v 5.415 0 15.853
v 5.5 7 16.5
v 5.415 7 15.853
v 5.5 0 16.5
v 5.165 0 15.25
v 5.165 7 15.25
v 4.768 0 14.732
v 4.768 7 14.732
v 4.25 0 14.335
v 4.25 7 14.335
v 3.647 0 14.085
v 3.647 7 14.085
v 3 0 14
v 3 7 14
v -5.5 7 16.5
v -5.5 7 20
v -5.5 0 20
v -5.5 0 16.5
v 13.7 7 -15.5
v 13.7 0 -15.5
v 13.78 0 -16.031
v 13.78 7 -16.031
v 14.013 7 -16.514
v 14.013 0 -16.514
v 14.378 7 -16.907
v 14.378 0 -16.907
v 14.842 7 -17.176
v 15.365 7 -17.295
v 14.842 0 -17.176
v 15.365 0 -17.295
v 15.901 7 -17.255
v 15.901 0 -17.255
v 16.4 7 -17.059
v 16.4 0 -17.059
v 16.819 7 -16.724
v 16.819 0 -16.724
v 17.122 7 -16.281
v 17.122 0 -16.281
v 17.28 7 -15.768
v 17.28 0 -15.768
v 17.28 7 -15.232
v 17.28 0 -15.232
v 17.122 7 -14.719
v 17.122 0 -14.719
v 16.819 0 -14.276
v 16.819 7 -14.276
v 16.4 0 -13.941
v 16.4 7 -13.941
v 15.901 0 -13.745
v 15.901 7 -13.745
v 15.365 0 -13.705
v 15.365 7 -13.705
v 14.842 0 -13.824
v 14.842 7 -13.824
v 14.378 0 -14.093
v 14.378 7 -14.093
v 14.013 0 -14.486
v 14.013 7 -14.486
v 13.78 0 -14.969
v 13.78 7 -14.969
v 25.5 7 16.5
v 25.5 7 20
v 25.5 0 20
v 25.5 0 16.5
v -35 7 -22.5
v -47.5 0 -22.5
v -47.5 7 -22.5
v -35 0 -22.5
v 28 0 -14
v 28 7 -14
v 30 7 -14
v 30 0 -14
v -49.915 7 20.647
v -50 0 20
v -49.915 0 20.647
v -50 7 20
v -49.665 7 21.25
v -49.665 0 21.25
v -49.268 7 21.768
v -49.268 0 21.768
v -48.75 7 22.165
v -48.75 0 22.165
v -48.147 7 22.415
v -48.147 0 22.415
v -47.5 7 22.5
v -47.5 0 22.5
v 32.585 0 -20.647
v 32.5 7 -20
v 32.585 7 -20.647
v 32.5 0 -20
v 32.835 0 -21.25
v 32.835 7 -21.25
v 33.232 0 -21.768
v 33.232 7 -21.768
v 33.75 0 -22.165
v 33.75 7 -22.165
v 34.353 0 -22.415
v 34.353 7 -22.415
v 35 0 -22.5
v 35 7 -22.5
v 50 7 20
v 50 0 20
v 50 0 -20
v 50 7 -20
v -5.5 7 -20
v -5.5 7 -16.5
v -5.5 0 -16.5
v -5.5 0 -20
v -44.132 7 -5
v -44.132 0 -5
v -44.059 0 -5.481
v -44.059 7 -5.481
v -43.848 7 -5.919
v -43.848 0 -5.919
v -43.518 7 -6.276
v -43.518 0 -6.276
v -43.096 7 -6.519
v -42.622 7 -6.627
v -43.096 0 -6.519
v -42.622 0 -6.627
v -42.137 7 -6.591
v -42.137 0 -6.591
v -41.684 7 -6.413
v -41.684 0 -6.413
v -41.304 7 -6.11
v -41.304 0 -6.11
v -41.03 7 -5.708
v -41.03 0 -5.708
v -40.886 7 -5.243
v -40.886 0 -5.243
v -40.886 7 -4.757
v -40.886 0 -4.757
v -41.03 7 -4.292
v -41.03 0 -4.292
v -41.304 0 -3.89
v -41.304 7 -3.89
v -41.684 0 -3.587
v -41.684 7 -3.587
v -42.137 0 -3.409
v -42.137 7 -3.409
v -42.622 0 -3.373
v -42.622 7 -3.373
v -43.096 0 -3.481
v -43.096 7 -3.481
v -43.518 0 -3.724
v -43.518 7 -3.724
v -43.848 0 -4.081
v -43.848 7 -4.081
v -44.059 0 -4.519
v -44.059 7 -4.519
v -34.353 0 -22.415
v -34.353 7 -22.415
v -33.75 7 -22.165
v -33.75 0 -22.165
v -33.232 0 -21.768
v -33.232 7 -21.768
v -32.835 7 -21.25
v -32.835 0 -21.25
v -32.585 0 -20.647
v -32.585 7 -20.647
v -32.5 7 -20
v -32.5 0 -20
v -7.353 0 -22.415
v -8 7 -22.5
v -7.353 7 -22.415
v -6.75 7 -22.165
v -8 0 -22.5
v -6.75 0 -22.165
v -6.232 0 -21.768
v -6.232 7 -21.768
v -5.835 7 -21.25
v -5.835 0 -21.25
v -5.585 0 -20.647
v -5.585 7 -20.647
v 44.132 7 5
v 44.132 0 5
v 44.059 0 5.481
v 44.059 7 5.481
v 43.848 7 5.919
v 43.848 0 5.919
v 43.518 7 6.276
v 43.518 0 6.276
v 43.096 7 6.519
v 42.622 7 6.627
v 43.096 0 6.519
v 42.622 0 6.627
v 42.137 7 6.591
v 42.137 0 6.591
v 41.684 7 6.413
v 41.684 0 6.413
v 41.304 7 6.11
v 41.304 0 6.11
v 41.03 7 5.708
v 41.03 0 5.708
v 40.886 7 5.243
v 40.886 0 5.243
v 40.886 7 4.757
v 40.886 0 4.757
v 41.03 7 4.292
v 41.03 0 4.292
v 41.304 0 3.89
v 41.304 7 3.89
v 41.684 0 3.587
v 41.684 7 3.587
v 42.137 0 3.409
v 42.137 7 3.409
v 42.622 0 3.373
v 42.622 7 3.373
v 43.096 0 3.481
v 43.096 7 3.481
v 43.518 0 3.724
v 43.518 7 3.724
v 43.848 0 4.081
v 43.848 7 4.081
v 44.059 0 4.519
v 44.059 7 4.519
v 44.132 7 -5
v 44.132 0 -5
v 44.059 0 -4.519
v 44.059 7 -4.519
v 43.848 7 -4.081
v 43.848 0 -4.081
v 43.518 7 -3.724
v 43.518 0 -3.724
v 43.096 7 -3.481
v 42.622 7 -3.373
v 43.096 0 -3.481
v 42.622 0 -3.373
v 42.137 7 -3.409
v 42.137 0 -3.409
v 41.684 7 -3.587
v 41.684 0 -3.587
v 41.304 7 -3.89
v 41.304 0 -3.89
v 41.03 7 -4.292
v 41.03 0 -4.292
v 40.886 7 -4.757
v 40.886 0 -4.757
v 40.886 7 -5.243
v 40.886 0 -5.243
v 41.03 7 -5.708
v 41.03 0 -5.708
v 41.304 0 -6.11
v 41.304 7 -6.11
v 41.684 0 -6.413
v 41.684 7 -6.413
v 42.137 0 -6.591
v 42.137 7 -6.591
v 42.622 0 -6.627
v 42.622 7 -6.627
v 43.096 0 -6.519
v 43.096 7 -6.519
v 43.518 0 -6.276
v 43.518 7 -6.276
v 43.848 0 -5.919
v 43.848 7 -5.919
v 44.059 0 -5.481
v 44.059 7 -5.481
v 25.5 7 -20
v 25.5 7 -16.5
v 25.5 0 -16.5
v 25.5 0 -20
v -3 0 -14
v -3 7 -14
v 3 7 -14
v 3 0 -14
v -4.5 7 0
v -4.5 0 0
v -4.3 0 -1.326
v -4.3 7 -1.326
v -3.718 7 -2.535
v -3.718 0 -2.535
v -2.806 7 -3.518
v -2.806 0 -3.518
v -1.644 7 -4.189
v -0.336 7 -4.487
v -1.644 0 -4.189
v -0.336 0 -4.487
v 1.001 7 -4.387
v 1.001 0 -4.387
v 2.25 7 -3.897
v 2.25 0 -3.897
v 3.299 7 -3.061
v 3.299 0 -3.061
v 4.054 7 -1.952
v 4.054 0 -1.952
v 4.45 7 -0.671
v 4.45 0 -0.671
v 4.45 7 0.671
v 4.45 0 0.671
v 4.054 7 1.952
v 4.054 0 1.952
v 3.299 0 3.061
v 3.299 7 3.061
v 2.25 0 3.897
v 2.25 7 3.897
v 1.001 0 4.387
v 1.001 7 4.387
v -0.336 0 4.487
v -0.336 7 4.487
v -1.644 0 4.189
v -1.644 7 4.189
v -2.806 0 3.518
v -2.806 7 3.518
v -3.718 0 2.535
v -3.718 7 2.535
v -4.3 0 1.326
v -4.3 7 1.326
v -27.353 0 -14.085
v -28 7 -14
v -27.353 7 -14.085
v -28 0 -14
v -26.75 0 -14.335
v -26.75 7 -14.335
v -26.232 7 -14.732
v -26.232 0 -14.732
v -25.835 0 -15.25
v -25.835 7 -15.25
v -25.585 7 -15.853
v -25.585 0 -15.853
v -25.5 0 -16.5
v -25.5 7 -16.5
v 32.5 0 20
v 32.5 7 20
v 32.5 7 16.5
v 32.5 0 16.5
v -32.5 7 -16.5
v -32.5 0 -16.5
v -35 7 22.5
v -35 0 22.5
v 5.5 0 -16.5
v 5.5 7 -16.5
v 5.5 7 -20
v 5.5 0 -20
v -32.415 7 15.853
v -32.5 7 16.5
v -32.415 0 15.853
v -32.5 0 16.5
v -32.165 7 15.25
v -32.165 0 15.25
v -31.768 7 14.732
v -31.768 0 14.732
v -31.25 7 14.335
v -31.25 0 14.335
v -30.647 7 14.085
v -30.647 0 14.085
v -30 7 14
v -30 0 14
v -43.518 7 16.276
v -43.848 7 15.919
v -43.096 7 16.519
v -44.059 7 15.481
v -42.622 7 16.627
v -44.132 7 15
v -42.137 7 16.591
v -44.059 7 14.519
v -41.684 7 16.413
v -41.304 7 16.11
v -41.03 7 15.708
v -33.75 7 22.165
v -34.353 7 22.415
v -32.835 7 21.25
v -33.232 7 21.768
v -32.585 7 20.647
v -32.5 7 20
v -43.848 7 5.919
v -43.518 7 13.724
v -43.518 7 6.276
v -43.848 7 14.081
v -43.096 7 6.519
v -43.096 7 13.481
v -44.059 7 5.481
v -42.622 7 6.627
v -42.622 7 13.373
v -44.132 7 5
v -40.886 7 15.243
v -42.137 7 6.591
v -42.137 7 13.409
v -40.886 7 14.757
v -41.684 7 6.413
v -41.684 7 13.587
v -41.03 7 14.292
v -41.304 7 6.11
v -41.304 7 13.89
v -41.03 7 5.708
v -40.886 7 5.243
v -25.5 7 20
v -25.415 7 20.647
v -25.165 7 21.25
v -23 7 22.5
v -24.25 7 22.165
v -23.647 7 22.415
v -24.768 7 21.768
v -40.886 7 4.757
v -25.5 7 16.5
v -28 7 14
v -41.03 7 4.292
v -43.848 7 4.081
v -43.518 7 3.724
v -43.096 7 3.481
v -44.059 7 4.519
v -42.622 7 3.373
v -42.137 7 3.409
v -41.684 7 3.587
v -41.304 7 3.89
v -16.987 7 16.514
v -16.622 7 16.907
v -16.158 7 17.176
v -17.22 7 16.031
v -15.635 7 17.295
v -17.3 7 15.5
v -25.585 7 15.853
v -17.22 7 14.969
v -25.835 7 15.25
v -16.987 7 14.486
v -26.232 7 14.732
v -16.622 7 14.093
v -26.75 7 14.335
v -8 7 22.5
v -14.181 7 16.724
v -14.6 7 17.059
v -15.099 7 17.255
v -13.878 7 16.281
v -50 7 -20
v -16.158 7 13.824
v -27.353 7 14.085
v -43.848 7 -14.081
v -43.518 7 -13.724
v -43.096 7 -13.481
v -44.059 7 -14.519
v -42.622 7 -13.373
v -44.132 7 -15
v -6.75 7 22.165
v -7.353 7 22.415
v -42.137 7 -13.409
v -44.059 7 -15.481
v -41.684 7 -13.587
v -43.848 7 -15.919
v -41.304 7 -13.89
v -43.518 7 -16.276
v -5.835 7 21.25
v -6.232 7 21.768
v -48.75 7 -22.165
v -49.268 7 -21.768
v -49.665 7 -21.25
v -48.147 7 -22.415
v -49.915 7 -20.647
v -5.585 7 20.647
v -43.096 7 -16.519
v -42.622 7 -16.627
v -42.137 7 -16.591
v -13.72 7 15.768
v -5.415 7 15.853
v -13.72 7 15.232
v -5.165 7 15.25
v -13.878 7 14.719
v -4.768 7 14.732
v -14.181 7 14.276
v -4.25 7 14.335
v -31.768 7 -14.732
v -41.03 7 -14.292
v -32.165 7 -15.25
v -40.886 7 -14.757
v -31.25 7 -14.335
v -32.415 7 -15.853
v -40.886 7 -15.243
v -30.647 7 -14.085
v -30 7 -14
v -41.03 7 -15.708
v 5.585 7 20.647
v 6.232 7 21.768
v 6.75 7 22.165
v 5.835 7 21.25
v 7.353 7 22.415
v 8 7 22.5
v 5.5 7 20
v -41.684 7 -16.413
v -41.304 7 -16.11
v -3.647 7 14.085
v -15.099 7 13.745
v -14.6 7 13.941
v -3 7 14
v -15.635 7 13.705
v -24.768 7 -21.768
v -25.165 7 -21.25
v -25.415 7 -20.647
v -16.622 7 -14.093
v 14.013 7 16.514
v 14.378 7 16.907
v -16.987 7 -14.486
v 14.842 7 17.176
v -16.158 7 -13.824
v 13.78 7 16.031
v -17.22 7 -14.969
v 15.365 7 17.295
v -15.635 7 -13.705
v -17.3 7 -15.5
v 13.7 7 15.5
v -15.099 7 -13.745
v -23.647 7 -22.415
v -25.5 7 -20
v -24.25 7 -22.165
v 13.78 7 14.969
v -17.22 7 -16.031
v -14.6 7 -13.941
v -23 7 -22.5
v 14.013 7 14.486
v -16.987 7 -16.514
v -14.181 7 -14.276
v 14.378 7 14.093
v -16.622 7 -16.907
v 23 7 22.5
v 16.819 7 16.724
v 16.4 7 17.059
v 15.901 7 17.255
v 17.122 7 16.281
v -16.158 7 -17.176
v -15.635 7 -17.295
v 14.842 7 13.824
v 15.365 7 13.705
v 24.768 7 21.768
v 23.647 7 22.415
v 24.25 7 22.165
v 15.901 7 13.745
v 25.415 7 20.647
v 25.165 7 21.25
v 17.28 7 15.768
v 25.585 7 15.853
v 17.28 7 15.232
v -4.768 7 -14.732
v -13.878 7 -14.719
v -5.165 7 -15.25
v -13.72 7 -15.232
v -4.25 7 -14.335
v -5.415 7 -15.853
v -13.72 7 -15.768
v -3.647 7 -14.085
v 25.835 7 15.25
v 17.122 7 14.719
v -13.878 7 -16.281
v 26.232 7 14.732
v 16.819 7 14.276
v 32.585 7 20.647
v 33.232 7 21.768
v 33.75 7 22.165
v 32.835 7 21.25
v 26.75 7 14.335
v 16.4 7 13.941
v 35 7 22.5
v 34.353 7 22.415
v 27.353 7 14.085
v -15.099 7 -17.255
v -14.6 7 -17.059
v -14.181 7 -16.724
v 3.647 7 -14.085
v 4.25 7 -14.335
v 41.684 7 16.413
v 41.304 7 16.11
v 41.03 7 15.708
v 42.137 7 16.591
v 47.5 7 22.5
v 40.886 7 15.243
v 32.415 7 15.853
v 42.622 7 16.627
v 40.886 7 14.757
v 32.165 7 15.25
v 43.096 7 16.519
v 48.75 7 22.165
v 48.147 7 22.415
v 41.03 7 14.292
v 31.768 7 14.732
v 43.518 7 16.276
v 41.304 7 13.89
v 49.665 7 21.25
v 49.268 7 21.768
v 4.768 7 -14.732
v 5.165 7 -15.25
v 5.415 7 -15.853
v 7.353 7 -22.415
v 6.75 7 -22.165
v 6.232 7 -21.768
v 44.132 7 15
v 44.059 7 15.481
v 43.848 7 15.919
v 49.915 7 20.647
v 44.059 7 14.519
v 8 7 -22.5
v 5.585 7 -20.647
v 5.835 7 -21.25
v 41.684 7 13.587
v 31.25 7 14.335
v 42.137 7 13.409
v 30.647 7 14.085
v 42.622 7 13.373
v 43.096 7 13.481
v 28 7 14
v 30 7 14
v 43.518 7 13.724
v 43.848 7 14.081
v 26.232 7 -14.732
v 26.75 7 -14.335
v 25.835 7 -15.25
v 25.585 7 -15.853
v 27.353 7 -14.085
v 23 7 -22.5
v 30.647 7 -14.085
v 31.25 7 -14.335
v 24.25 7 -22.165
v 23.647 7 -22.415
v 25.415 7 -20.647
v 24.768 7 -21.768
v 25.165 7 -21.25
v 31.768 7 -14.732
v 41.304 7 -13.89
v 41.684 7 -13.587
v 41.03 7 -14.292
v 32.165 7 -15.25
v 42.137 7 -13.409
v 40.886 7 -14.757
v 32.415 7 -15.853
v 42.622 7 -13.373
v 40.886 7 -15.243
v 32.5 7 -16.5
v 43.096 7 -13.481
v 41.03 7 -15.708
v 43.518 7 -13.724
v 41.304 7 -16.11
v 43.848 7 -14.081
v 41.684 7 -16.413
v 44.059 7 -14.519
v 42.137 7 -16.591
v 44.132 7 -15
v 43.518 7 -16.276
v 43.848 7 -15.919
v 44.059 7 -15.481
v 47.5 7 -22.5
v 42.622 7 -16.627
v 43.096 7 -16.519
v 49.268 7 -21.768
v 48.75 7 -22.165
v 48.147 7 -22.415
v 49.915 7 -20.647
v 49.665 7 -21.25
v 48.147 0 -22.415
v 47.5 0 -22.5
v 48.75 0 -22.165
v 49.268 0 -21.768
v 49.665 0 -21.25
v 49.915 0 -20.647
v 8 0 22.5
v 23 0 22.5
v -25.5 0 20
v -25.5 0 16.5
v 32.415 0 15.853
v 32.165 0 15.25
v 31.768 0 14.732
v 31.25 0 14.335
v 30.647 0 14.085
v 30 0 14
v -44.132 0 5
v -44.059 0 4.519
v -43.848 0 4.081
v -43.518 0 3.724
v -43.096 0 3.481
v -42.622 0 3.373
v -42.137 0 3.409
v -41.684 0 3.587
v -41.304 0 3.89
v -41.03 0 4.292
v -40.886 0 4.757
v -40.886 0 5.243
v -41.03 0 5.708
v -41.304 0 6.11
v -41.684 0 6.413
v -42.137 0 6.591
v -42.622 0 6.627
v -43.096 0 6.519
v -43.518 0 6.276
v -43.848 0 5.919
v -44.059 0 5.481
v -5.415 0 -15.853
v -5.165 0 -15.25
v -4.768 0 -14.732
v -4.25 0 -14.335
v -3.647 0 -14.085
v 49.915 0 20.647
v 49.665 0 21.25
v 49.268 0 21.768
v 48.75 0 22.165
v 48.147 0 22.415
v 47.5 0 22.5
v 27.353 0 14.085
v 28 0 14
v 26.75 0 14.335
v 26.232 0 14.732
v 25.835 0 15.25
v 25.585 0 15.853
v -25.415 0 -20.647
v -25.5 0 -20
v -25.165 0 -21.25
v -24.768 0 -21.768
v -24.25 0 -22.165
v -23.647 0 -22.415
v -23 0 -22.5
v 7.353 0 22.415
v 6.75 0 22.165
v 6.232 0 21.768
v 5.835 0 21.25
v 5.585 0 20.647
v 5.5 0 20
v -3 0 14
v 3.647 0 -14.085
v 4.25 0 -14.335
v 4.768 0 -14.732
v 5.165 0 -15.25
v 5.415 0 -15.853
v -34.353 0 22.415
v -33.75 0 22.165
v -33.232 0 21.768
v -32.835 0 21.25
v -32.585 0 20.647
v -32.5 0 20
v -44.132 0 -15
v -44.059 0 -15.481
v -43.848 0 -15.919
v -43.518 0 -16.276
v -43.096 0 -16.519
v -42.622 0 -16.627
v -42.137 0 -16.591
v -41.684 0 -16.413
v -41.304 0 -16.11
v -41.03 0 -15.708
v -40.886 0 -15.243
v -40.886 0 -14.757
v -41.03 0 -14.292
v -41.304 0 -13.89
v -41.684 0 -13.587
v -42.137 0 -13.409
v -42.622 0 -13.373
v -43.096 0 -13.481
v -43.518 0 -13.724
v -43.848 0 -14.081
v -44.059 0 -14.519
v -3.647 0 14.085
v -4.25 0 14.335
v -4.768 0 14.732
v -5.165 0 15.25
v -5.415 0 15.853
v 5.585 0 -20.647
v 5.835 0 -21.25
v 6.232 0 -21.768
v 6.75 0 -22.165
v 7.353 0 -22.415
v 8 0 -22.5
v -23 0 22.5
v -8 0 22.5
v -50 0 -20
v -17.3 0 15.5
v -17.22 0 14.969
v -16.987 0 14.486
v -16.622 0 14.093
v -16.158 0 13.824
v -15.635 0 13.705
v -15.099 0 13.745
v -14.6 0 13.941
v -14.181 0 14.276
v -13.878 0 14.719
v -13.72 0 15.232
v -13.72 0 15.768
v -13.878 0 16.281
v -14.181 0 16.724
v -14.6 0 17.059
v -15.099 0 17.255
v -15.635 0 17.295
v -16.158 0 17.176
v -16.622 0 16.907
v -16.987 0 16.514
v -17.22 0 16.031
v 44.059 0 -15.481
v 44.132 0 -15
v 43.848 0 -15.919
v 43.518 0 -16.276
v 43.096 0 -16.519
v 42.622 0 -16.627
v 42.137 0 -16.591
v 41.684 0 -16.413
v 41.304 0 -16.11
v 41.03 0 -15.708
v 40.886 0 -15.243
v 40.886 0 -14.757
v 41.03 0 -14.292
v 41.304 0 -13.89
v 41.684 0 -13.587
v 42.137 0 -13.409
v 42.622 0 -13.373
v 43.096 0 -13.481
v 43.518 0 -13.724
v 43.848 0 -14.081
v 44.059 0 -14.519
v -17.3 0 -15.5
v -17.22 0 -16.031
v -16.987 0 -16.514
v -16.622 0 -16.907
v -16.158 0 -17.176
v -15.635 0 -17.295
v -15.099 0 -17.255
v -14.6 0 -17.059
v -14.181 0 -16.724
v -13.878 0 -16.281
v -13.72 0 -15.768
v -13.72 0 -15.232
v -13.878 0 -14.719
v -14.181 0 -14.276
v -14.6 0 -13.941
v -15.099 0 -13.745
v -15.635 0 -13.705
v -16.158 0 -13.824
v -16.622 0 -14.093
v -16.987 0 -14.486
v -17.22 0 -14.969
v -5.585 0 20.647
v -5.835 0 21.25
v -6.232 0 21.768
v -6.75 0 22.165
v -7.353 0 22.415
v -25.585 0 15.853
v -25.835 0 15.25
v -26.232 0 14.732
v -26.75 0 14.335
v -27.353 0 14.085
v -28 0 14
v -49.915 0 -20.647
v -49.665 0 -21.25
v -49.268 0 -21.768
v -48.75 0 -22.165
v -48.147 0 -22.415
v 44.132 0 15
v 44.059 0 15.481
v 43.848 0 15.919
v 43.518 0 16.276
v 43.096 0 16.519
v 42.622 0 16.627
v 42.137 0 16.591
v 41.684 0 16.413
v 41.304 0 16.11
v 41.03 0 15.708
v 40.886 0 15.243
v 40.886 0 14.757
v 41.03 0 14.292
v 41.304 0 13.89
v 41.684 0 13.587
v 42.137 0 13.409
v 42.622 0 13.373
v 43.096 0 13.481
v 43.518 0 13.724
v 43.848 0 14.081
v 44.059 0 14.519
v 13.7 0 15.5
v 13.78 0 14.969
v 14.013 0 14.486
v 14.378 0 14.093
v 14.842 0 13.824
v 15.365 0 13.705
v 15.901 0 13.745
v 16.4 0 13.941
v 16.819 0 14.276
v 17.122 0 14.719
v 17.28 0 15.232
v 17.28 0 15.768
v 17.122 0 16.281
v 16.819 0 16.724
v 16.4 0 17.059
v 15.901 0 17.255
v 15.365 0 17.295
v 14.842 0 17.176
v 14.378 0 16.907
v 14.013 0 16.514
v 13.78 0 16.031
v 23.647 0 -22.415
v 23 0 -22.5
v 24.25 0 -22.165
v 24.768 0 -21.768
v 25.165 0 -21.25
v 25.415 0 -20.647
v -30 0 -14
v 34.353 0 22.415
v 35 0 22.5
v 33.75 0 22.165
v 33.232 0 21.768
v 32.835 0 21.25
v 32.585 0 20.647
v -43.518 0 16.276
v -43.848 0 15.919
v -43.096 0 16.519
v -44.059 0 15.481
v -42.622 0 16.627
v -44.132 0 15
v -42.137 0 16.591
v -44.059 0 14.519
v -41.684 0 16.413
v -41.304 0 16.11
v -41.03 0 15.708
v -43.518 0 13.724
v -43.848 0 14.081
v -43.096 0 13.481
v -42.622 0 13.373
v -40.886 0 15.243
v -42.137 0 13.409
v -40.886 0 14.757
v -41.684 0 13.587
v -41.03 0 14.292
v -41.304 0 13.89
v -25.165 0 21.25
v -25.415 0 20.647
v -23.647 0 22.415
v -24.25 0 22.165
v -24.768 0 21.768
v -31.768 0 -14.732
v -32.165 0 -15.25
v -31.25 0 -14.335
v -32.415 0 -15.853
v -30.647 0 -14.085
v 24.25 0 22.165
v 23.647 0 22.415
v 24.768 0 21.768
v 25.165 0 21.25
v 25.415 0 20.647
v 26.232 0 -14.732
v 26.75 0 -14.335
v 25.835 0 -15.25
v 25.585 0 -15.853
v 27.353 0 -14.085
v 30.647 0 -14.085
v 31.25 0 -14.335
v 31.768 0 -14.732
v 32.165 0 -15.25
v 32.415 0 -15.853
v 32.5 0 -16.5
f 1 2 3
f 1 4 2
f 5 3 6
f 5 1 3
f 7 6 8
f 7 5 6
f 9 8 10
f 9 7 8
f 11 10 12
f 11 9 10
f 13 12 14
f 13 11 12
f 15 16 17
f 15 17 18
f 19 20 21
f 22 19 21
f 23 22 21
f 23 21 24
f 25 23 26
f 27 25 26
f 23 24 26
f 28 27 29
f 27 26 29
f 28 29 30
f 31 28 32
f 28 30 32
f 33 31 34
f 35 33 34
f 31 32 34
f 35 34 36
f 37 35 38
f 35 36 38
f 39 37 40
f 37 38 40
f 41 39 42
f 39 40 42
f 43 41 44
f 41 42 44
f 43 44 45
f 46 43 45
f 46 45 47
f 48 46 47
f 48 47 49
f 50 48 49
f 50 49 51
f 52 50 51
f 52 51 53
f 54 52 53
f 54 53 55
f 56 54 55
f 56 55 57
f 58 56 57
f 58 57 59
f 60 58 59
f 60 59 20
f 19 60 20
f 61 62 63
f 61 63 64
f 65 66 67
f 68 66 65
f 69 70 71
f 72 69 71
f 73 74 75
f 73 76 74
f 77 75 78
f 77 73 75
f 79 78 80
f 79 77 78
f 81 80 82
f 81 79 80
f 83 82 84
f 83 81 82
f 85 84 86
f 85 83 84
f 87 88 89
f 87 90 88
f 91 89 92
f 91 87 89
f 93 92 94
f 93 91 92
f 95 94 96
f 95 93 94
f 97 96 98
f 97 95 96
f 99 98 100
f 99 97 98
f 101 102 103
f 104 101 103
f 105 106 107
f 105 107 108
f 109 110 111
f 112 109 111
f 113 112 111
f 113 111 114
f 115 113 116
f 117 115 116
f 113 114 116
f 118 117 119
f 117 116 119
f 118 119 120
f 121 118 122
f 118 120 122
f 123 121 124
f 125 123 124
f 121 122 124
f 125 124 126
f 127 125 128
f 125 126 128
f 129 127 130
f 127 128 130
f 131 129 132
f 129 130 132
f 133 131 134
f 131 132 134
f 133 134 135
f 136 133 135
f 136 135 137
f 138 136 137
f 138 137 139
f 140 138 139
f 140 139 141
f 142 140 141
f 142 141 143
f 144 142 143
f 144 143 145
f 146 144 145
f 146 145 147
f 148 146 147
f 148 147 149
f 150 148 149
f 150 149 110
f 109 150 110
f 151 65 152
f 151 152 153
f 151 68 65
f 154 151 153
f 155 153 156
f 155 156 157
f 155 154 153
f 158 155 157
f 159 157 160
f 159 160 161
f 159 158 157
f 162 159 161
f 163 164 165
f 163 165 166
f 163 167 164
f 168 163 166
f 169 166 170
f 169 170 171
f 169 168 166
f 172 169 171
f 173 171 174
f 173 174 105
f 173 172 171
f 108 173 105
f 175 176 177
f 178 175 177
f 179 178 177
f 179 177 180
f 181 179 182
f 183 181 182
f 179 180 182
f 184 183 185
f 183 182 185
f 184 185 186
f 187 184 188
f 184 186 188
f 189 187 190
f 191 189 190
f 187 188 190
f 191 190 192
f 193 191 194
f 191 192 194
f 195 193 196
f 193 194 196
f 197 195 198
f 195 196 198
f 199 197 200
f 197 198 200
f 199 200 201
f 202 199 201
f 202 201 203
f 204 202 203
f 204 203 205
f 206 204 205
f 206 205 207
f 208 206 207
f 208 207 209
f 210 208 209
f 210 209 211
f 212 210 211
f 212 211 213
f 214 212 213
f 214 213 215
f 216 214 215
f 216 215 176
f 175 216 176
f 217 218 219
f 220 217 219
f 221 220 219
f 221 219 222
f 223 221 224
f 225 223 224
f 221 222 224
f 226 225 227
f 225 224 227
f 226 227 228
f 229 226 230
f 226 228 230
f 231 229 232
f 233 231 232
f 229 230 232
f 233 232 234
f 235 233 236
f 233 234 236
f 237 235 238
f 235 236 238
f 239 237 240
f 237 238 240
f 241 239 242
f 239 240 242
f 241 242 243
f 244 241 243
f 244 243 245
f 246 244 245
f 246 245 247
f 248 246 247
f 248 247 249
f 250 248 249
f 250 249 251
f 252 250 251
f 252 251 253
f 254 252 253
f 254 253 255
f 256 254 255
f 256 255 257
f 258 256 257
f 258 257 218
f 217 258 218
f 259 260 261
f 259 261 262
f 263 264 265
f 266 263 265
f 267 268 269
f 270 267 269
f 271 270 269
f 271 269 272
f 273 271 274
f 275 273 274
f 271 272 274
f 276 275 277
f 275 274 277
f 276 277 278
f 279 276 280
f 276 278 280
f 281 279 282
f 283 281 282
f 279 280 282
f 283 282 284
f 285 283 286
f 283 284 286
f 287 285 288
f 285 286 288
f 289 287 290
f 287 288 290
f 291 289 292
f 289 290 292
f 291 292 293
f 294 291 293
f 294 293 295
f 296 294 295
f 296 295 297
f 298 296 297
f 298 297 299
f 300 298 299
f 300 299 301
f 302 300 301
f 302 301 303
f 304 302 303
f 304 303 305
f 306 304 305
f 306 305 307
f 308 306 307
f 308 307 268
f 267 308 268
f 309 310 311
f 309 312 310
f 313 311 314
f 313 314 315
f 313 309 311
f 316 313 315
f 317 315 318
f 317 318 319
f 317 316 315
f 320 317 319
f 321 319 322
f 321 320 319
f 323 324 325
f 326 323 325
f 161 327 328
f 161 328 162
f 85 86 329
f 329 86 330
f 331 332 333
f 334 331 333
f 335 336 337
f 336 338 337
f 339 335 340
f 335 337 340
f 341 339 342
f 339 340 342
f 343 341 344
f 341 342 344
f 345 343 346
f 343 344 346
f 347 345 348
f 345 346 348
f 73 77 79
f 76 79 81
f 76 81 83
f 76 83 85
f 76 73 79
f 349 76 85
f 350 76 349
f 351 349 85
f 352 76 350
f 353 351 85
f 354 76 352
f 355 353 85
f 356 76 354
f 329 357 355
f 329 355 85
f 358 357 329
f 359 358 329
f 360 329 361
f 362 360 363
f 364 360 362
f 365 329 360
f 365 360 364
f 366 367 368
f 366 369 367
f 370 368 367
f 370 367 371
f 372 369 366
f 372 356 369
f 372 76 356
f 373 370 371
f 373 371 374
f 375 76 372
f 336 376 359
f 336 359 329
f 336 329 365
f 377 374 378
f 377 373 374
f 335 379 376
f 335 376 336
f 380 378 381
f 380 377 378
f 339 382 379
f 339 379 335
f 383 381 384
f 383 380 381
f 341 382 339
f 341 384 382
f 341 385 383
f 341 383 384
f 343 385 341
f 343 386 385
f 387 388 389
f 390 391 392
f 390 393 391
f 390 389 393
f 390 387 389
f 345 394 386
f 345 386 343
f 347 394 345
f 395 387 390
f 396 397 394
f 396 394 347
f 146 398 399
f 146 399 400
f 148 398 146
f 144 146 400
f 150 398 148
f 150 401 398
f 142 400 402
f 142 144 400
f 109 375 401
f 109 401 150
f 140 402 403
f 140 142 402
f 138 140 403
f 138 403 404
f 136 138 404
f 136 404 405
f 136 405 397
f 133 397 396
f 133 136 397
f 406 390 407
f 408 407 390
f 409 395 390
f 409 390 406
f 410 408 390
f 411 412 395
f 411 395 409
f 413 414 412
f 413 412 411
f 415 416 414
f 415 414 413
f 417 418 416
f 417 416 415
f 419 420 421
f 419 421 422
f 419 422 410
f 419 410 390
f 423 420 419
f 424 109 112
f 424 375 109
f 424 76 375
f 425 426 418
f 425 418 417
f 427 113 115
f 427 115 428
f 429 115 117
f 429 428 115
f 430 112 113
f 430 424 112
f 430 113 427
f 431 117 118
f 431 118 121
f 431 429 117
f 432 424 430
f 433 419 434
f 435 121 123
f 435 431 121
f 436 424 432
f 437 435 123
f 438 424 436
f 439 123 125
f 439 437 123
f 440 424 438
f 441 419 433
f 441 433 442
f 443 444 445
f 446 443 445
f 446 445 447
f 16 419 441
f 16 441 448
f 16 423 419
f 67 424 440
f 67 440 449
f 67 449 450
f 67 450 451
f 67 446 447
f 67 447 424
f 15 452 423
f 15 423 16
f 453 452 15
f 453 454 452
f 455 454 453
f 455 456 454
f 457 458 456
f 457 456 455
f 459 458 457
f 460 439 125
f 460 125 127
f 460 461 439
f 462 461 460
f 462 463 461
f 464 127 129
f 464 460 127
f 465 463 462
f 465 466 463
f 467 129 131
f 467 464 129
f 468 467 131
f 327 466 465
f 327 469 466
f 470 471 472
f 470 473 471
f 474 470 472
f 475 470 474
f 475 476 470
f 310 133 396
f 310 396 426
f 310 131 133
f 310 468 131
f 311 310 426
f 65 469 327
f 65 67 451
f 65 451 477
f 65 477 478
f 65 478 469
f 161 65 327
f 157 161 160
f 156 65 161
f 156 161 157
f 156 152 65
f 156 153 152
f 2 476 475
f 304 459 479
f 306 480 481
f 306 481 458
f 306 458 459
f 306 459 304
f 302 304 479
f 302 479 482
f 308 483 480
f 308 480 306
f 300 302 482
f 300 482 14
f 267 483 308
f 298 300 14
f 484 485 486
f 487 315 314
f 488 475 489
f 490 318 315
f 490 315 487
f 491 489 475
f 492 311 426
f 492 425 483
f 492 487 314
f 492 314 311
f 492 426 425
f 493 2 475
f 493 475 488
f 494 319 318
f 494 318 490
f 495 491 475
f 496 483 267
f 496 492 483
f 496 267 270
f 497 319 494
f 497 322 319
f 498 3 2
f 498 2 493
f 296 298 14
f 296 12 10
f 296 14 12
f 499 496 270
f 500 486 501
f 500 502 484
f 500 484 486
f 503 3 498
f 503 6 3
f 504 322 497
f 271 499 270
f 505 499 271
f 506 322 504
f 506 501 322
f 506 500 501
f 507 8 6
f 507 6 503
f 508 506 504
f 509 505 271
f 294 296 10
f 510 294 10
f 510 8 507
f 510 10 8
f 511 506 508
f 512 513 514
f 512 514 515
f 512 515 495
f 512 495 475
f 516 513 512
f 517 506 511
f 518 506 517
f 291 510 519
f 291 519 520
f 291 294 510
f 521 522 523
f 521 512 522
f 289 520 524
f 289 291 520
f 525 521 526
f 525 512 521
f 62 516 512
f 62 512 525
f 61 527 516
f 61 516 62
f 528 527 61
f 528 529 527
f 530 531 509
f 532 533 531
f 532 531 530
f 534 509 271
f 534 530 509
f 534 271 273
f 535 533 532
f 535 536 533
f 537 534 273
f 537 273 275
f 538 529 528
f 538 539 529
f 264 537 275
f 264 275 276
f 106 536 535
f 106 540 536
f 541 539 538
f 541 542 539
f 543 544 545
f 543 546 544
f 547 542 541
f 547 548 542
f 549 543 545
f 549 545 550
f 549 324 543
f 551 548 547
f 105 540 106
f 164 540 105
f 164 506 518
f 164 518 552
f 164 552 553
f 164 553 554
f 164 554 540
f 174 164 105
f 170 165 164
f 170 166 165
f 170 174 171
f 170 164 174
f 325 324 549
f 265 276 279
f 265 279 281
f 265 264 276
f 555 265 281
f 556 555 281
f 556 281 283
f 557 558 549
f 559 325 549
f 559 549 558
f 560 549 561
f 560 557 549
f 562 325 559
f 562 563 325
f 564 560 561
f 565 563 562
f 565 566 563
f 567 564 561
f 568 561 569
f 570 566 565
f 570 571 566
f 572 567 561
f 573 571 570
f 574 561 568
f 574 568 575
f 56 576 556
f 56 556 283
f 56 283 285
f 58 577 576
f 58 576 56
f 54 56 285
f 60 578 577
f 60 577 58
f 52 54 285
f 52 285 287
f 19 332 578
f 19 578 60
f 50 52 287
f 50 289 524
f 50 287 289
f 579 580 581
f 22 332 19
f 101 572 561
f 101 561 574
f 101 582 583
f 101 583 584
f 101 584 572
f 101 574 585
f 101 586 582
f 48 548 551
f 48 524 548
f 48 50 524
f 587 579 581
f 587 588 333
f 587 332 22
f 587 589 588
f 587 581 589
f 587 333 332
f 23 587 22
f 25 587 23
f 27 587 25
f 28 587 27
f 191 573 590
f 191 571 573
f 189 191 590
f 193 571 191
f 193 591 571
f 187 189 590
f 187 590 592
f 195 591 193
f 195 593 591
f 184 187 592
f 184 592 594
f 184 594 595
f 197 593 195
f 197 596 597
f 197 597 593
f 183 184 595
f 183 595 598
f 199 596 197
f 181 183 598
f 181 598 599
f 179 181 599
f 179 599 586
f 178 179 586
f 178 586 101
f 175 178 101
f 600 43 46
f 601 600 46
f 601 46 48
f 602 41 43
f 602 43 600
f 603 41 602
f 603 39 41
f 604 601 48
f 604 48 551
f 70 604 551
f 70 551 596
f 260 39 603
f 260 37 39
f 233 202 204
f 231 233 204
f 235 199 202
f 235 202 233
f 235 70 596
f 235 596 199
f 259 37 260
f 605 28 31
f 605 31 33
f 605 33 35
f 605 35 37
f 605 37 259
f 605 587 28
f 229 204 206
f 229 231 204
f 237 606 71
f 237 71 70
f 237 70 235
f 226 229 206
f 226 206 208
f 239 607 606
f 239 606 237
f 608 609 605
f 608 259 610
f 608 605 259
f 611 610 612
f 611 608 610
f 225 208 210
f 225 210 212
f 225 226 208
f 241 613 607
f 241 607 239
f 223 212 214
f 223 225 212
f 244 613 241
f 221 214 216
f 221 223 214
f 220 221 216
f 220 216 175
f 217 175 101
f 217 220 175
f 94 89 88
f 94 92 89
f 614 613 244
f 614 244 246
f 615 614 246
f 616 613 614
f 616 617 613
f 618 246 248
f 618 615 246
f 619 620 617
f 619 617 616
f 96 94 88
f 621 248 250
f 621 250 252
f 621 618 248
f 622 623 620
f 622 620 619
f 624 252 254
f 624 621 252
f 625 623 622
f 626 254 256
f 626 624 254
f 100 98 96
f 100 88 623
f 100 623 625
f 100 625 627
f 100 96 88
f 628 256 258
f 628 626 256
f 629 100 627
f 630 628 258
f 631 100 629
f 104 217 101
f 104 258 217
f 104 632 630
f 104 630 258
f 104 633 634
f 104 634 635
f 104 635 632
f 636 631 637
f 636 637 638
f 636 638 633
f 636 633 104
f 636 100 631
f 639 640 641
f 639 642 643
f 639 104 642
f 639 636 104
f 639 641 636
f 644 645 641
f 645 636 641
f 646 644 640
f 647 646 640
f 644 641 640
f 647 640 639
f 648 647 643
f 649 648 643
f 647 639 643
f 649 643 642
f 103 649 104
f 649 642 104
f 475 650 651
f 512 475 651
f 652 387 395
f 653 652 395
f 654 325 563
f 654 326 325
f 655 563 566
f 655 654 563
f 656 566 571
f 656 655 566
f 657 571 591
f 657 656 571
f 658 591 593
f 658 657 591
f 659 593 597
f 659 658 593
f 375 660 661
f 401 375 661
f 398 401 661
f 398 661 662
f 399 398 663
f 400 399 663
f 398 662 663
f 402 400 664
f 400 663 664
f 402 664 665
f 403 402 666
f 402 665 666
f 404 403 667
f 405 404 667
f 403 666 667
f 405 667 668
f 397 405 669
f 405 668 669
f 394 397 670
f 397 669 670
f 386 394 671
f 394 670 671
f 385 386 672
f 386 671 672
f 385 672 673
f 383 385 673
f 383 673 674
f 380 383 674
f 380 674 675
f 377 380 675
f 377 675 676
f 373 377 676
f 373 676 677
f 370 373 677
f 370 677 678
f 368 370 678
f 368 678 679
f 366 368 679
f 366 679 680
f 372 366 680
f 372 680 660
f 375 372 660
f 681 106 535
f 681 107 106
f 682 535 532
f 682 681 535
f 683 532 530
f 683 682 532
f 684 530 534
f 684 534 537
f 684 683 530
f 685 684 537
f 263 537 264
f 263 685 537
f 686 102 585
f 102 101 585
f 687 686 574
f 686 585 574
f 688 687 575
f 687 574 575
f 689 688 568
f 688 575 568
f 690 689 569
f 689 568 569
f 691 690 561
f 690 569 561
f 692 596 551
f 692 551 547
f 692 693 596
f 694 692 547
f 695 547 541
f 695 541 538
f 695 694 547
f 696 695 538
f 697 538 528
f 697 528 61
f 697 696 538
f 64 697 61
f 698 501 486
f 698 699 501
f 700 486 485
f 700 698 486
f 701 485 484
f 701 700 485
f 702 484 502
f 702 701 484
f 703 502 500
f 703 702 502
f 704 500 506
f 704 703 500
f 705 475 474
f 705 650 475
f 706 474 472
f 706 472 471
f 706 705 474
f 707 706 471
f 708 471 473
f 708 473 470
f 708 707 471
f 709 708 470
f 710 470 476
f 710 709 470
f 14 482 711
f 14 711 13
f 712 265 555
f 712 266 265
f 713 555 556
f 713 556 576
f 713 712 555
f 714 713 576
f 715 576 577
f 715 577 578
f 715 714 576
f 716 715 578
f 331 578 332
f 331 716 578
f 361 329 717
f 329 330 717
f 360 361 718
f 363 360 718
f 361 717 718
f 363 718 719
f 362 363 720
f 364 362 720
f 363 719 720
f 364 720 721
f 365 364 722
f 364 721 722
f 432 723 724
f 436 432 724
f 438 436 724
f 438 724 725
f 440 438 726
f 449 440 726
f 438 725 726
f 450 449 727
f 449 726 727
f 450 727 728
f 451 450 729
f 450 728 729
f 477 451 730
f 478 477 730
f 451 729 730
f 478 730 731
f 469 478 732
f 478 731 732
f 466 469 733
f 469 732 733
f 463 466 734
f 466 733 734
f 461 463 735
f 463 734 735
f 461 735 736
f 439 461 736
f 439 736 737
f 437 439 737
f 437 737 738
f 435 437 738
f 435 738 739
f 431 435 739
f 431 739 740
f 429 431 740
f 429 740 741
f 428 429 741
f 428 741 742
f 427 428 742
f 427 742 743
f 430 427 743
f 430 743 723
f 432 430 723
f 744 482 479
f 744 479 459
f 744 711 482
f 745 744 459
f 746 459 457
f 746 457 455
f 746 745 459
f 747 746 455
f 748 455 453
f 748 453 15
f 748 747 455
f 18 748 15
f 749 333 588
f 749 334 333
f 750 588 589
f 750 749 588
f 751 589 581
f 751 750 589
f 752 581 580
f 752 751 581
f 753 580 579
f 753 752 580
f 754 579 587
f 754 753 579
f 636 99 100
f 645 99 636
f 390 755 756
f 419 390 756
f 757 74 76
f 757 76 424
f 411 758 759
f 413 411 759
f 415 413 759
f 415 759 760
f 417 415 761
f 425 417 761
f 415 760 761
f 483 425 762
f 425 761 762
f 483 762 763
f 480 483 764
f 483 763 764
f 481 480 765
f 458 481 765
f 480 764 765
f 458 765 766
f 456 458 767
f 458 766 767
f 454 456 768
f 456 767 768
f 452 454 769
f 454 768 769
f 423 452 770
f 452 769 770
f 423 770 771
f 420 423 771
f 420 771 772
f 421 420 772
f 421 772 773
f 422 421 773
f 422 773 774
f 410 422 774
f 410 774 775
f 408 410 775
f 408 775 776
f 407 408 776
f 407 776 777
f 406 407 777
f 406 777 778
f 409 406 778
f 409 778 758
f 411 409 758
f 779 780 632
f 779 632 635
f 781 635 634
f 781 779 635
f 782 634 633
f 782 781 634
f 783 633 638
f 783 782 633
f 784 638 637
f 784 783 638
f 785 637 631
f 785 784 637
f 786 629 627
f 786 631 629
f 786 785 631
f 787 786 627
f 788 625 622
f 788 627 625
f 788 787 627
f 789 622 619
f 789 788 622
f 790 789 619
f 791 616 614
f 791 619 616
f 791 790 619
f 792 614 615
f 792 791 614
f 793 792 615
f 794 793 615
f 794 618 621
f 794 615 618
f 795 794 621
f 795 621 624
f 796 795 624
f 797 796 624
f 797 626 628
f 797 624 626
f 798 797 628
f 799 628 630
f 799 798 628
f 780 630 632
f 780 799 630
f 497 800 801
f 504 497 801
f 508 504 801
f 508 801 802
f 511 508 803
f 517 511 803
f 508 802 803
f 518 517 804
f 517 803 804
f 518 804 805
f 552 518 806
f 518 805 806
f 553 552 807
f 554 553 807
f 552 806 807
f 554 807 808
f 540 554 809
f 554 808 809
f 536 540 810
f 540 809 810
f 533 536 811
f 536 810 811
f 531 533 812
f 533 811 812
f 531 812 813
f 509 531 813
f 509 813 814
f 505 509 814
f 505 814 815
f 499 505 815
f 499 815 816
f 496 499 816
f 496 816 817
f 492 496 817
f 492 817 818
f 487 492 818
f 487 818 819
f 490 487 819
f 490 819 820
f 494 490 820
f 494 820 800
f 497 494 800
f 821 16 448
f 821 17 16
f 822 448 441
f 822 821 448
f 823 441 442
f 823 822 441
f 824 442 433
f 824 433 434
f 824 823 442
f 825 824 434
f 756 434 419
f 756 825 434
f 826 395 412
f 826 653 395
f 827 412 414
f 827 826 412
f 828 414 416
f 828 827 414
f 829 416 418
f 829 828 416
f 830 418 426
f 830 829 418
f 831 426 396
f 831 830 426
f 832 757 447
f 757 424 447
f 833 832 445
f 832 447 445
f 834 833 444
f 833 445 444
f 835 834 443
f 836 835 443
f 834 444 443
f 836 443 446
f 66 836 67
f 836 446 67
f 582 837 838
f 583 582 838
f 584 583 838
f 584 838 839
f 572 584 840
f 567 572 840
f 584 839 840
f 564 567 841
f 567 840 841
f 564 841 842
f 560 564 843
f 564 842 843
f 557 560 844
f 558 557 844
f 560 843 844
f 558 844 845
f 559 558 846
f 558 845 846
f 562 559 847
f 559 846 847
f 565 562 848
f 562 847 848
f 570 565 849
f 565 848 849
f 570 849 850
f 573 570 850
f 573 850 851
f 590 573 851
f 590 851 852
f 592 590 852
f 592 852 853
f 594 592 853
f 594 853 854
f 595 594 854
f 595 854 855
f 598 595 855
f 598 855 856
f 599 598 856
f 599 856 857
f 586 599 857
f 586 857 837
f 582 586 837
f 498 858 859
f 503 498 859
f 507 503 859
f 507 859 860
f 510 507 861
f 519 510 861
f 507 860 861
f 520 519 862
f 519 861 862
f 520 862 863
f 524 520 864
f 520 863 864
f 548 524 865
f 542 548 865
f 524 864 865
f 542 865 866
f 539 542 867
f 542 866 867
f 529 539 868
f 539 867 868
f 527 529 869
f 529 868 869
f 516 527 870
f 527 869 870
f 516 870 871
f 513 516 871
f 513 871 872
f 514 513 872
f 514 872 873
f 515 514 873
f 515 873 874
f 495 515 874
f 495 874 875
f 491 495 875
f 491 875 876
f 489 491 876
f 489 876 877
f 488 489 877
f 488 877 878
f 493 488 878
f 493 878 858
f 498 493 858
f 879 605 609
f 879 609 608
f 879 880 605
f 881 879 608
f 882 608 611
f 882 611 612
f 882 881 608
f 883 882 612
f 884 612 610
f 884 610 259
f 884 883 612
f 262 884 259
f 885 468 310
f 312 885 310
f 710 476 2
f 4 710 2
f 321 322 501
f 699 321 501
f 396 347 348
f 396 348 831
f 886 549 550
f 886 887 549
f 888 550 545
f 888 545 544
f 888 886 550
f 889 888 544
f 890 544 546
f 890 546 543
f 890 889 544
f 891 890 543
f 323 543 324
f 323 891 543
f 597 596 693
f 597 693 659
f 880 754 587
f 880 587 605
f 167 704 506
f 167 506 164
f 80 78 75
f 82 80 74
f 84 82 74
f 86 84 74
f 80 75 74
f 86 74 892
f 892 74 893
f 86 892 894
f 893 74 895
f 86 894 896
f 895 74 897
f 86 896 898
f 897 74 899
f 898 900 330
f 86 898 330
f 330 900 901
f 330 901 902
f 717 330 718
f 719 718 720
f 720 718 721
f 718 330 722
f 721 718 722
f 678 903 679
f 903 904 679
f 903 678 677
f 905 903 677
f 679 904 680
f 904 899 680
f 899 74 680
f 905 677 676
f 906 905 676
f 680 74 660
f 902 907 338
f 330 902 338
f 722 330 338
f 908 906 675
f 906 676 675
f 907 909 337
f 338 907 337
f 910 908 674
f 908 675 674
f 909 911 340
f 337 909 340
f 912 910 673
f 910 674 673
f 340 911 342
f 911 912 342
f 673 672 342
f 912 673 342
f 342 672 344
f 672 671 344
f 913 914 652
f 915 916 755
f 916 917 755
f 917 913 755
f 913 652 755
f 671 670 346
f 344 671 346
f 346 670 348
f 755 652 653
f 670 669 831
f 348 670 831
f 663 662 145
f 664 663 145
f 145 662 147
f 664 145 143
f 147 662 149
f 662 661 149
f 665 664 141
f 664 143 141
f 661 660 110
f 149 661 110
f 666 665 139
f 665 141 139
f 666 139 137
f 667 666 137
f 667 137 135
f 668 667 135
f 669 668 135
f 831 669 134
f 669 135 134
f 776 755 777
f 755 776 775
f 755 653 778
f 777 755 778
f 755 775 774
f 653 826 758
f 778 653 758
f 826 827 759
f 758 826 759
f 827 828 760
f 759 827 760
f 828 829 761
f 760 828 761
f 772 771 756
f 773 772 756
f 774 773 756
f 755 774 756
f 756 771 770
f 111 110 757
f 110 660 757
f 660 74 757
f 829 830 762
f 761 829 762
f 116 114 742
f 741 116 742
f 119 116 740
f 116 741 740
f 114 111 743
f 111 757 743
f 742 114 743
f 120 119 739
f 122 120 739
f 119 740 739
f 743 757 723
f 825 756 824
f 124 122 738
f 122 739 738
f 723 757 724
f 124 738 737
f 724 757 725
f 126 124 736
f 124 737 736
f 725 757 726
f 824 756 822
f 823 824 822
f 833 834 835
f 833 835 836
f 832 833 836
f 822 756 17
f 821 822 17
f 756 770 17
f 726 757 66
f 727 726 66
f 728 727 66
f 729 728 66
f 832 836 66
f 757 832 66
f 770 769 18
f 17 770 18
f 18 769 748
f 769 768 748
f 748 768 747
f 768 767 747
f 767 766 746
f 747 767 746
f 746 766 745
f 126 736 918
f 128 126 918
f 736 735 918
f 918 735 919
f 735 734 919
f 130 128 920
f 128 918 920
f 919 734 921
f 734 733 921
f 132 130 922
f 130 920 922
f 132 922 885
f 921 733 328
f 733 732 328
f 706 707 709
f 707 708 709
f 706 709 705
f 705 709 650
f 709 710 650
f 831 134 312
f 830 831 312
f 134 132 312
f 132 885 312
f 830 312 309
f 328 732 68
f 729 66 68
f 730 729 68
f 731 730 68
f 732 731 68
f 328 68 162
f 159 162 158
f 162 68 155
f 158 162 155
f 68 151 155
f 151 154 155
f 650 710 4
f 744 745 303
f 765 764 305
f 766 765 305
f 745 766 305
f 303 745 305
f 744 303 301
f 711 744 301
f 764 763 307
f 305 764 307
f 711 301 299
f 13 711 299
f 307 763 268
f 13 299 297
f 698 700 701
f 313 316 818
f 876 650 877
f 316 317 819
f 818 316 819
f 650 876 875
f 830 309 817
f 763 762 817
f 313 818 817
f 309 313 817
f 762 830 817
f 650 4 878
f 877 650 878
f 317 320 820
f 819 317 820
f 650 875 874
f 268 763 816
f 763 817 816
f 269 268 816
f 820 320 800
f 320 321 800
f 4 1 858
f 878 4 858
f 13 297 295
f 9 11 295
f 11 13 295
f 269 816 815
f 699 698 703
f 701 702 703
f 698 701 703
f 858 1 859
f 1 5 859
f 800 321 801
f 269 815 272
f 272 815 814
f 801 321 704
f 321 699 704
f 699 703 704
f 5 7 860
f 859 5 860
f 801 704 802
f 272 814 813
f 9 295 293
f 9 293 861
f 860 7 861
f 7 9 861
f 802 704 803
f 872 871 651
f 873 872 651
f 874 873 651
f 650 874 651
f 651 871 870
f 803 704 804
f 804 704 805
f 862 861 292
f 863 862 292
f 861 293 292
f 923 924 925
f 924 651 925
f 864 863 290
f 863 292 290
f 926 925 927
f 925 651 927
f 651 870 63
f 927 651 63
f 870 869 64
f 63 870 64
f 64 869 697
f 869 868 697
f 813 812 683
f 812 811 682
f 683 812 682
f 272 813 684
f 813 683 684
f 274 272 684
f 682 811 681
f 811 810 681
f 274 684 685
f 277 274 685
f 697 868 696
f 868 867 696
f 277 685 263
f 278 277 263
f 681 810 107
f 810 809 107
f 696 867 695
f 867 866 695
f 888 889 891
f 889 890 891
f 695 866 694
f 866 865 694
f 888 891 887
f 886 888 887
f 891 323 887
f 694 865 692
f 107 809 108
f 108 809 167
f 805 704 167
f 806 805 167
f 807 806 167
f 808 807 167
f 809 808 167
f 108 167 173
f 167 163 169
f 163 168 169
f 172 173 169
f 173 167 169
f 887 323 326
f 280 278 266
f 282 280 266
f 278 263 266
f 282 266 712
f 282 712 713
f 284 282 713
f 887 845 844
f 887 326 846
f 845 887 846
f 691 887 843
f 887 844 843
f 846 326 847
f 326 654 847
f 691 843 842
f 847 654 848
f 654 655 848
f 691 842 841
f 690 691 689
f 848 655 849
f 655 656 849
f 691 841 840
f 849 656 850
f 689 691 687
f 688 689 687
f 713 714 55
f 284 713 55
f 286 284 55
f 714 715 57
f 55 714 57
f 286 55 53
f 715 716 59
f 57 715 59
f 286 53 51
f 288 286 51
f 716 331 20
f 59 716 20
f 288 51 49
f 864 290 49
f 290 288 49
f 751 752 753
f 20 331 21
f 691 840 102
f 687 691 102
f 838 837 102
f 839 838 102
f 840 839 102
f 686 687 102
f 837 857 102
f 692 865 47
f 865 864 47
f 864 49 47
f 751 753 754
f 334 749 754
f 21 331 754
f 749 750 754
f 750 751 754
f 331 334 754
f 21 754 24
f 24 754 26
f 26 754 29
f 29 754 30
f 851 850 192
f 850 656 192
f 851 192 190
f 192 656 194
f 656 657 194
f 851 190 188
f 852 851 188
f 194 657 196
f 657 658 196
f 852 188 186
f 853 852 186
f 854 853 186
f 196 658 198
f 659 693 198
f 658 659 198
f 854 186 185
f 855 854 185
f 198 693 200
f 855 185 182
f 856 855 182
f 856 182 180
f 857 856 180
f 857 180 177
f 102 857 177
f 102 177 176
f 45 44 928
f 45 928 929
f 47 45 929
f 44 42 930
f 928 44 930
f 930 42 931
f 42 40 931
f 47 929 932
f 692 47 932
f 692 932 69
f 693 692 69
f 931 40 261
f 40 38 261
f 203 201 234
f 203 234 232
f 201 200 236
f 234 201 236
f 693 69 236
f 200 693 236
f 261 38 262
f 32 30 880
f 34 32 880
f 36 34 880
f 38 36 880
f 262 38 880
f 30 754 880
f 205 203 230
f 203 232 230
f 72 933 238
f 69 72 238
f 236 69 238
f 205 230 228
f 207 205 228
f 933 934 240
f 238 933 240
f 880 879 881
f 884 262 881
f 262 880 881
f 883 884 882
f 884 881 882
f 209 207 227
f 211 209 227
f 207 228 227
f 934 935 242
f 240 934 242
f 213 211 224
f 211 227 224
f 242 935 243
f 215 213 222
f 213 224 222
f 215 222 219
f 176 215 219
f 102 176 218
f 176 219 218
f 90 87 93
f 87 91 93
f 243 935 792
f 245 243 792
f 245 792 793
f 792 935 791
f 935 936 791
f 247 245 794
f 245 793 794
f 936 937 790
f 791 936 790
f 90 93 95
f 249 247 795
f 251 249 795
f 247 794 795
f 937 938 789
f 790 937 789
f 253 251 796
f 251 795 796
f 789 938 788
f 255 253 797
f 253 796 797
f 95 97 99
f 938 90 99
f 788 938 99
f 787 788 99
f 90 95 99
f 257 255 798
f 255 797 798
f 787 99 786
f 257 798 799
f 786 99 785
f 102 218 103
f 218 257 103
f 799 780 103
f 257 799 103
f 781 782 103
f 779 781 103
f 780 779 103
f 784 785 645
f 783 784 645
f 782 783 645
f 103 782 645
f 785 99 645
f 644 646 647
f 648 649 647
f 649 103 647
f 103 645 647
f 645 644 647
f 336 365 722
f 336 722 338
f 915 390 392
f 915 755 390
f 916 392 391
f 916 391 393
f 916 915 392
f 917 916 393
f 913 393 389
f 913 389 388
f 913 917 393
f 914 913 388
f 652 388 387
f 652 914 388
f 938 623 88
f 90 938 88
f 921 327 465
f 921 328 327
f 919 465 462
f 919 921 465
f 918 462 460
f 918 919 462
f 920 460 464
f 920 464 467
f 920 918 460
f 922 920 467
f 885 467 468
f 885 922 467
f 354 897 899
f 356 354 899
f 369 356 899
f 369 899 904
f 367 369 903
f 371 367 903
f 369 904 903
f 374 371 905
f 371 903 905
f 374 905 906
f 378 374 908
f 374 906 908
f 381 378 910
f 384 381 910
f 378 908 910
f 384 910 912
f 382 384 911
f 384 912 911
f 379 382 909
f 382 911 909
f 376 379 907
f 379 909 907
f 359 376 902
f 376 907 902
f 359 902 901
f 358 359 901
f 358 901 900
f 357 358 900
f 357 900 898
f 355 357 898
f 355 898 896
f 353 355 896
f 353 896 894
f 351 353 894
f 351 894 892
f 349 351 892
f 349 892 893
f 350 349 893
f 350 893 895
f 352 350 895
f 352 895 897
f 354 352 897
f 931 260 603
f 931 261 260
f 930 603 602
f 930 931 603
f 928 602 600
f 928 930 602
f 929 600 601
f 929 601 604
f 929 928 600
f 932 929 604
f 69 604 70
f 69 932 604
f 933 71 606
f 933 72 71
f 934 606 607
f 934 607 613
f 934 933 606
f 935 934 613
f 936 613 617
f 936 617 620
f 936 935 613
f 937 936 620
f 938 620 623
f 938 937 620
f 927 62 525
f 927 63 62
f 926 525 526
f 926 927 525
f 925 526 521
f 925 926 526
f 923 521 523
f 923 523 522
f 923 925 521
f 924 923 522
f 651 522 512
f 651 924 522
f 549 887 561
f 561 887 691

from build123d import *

# Parameters (mm, degrees)
SKETCH1_W             = 100
SKETCH1_H             = 45
BOSS_EXTRUDE1_DEPTH   = 7
M3_CLEARANCE_HOLE1_D  = 3.6
M8_CLEARANCE_HOLE1_D  = 9
F_4_CLEARANCE_HOLE1_D = 3.2639
LPATTERN1_COUNT       = 4
LPATTERN1_PITCH       = 10
MIRROR1_COPY_1_D      = 3.2639
MIRROR1_COPY_2_D      = 3.2639
MIRROR1_COPY_3_D      = 3.2639
SKETCH9_W             = 7
SKETCH9_H             = 8.5
SKETCH9_W_2           = 11
CUT_EXTRUDE1_DEPTH    = 8
FILLET1_R             = 2.5


with BuildPart() as part:
    # Sketch1 → Boss-Extrude1 (new body)
    with BuildSketch(Plane(origin=(0, 0, 0), x_dir=(1, 0, 0), z_dir=(0, 1, 0))):
        Rectangle(SKETCH1_W, SKETCH1_H)
    extrude(amount=BOSS_EXTRUDE1_DEPTH)

    # M3 Clearance Hole1 (through all)
    with Locations(Plane(origin=(0, 7, 0), x_dir=(1, 0, 0), z_dir=(0, 1, 0))):
        with Locations((15.5, 15.5), (-15.5, 15.5), (-15.5, -15.5), (15.5, -15.5)):
            Hole(M3_CLEARANCE_HOLE1_D / 2)

    # M8 Clearance Hole1 (through all)
    with Locations(Plane(origin=(0, 7, 0), x_dir=(1, 0, 0), z_dir=(0, 1, 0))):
        with Locations((0, 0)):
            Hole(M8_CLEARANCE_HOLE1_D / 2)

    # #4 Clearance Hole1 (through all)
    with Locations(Plane(origin=(0, 7, 0), x_dir=(1, 0, 0), z_dir=(0, 1, 0))):
        with Locations((-42.5, 15)):
            f_4_clearance_hole1 = Hole(F_4_CLEARANCE_HOLE1_D / 2)

    # LPattern1: #4 Clearance Hole1 ×4
    with Locations(*[(0, 0, i * LPATTERN1_PITCH) for i in range(1, LPATTERN1_COUNT)]):
        add(f_4_clearance_hole1, mode=Mode.SUBTRACT)

    # Mirror1: #4 Clearance Hole1 across plane
    add(f_4_clearance_hole1.mirror(Plane(origin=(0, 0, 0), x_dir=(0, 0, 1), z_dir=(1, 0, 0))), mode=Mode.SUBTRACT)

    # Mirror1 copy 1 (through all)
    with Locations(Plane(origin=(0, 7, 10), x_dir=(-1, 0, 0), z_dir=(0, 1, 0))):
        with Locations((-42.5, -15)):
            Hole(MIRROR1_COPY_1_D / 2)

    # Mirror1 copy 2 (through all)
    with Locations(Plane(origin=(0, 7, 20), x_dir=(-1, 0, 0), z_dir=(0, 1, 0))):
        with Locations((-42.5, -15)):
            Hole(MIRROR1_COPY_2_D / 2)

    # Mirror1 copy 3 (through all)
    with Locations(Plane(origin=(0, 7, 30), x_dir=(-1, 0, 0), z_dir=(0, 1, 0))):
        with Locations((-42.5, -15)):
            Hole(MIRROR1_COPY_3_D / 2)

    # Sketch9 → Cut-Extrude1 (cut, through all)
    with BuildSketch(Plane(origin=(0, 7, 0), x_dir=(1, 0, 0), z_dir=(0, 1, 0))):
        with Locations((-29, 18.25)):
            Rectangle(SKETCH9_W, SKETCH9_H)
        with Locations((-29, -18.25)):
            Rectangle(SKETCH9_W, SKETCH9_H)
        with Locations((29, -18.25)):
            Rectangle(SKETCH9_W, SKETCH9_H)
        with Locations((29, 18.25)):
            Rectangle(SKETCH9_W, SKETCH9_H)
        with Locations((0, 18.25)):
            Rectangle(SKETCH9_W_2, SKETCH9_H)
        with Locations((0, -18.25)):
            Rectangle(SKETCH9_W_2, SKETCH9_H)
    extrude(amount=-CUT_EXTRUDE1_DEPTH, mode=Mode.SUBTRACT)

    # Fillet1
    fillet1_edges = [part.edges().sort_by_distance(p)[0] for p in [
        (5.5, 3.5, 22.5),
        (-5.5, 3.5, 22.5),
        (-5.5, 3.5, 14),
        (5.5, 3.5, 14),
        (25.5, 3.5, -22.5),
        (32.5, 3.5, -22.5),
        (32.5, 3.5, -14),
        (25.5, 3.5, -14),
        (32.5, 3.5, 22.5),
        (25.5, 3.5, 22.5),
        (25.5, 3.5, 14),
        (32.5, 3.5, 14),
        (-25.5, 3.5, 22.5),
        (-32.5, 3.5, 22.5),
        (-32.5, 3.5, 14),
        (-25.5, 3.5, 14),
        (5.5, 3.5, -22.5),
        (5.5, 3.5, -14),
        (-5.5, 3.5, -14),
        (-5.5, 3.5, -22.5),
        (-32.5, 3.5, -22.5),
        (-25.5, 3.5, -22.5),
        (-25.5, 3.5, -14),
        (-32.5, 3.5, -14),
        (-50, 3.5, -22.5),
        (50, 3.5, -22.5),
        (50, 3.5, 22.5),
        (-50, 3.5, 22.5),
    ]]
    fillet(fillet1_edges, radius=FILLET1_R)


solid = part.part
